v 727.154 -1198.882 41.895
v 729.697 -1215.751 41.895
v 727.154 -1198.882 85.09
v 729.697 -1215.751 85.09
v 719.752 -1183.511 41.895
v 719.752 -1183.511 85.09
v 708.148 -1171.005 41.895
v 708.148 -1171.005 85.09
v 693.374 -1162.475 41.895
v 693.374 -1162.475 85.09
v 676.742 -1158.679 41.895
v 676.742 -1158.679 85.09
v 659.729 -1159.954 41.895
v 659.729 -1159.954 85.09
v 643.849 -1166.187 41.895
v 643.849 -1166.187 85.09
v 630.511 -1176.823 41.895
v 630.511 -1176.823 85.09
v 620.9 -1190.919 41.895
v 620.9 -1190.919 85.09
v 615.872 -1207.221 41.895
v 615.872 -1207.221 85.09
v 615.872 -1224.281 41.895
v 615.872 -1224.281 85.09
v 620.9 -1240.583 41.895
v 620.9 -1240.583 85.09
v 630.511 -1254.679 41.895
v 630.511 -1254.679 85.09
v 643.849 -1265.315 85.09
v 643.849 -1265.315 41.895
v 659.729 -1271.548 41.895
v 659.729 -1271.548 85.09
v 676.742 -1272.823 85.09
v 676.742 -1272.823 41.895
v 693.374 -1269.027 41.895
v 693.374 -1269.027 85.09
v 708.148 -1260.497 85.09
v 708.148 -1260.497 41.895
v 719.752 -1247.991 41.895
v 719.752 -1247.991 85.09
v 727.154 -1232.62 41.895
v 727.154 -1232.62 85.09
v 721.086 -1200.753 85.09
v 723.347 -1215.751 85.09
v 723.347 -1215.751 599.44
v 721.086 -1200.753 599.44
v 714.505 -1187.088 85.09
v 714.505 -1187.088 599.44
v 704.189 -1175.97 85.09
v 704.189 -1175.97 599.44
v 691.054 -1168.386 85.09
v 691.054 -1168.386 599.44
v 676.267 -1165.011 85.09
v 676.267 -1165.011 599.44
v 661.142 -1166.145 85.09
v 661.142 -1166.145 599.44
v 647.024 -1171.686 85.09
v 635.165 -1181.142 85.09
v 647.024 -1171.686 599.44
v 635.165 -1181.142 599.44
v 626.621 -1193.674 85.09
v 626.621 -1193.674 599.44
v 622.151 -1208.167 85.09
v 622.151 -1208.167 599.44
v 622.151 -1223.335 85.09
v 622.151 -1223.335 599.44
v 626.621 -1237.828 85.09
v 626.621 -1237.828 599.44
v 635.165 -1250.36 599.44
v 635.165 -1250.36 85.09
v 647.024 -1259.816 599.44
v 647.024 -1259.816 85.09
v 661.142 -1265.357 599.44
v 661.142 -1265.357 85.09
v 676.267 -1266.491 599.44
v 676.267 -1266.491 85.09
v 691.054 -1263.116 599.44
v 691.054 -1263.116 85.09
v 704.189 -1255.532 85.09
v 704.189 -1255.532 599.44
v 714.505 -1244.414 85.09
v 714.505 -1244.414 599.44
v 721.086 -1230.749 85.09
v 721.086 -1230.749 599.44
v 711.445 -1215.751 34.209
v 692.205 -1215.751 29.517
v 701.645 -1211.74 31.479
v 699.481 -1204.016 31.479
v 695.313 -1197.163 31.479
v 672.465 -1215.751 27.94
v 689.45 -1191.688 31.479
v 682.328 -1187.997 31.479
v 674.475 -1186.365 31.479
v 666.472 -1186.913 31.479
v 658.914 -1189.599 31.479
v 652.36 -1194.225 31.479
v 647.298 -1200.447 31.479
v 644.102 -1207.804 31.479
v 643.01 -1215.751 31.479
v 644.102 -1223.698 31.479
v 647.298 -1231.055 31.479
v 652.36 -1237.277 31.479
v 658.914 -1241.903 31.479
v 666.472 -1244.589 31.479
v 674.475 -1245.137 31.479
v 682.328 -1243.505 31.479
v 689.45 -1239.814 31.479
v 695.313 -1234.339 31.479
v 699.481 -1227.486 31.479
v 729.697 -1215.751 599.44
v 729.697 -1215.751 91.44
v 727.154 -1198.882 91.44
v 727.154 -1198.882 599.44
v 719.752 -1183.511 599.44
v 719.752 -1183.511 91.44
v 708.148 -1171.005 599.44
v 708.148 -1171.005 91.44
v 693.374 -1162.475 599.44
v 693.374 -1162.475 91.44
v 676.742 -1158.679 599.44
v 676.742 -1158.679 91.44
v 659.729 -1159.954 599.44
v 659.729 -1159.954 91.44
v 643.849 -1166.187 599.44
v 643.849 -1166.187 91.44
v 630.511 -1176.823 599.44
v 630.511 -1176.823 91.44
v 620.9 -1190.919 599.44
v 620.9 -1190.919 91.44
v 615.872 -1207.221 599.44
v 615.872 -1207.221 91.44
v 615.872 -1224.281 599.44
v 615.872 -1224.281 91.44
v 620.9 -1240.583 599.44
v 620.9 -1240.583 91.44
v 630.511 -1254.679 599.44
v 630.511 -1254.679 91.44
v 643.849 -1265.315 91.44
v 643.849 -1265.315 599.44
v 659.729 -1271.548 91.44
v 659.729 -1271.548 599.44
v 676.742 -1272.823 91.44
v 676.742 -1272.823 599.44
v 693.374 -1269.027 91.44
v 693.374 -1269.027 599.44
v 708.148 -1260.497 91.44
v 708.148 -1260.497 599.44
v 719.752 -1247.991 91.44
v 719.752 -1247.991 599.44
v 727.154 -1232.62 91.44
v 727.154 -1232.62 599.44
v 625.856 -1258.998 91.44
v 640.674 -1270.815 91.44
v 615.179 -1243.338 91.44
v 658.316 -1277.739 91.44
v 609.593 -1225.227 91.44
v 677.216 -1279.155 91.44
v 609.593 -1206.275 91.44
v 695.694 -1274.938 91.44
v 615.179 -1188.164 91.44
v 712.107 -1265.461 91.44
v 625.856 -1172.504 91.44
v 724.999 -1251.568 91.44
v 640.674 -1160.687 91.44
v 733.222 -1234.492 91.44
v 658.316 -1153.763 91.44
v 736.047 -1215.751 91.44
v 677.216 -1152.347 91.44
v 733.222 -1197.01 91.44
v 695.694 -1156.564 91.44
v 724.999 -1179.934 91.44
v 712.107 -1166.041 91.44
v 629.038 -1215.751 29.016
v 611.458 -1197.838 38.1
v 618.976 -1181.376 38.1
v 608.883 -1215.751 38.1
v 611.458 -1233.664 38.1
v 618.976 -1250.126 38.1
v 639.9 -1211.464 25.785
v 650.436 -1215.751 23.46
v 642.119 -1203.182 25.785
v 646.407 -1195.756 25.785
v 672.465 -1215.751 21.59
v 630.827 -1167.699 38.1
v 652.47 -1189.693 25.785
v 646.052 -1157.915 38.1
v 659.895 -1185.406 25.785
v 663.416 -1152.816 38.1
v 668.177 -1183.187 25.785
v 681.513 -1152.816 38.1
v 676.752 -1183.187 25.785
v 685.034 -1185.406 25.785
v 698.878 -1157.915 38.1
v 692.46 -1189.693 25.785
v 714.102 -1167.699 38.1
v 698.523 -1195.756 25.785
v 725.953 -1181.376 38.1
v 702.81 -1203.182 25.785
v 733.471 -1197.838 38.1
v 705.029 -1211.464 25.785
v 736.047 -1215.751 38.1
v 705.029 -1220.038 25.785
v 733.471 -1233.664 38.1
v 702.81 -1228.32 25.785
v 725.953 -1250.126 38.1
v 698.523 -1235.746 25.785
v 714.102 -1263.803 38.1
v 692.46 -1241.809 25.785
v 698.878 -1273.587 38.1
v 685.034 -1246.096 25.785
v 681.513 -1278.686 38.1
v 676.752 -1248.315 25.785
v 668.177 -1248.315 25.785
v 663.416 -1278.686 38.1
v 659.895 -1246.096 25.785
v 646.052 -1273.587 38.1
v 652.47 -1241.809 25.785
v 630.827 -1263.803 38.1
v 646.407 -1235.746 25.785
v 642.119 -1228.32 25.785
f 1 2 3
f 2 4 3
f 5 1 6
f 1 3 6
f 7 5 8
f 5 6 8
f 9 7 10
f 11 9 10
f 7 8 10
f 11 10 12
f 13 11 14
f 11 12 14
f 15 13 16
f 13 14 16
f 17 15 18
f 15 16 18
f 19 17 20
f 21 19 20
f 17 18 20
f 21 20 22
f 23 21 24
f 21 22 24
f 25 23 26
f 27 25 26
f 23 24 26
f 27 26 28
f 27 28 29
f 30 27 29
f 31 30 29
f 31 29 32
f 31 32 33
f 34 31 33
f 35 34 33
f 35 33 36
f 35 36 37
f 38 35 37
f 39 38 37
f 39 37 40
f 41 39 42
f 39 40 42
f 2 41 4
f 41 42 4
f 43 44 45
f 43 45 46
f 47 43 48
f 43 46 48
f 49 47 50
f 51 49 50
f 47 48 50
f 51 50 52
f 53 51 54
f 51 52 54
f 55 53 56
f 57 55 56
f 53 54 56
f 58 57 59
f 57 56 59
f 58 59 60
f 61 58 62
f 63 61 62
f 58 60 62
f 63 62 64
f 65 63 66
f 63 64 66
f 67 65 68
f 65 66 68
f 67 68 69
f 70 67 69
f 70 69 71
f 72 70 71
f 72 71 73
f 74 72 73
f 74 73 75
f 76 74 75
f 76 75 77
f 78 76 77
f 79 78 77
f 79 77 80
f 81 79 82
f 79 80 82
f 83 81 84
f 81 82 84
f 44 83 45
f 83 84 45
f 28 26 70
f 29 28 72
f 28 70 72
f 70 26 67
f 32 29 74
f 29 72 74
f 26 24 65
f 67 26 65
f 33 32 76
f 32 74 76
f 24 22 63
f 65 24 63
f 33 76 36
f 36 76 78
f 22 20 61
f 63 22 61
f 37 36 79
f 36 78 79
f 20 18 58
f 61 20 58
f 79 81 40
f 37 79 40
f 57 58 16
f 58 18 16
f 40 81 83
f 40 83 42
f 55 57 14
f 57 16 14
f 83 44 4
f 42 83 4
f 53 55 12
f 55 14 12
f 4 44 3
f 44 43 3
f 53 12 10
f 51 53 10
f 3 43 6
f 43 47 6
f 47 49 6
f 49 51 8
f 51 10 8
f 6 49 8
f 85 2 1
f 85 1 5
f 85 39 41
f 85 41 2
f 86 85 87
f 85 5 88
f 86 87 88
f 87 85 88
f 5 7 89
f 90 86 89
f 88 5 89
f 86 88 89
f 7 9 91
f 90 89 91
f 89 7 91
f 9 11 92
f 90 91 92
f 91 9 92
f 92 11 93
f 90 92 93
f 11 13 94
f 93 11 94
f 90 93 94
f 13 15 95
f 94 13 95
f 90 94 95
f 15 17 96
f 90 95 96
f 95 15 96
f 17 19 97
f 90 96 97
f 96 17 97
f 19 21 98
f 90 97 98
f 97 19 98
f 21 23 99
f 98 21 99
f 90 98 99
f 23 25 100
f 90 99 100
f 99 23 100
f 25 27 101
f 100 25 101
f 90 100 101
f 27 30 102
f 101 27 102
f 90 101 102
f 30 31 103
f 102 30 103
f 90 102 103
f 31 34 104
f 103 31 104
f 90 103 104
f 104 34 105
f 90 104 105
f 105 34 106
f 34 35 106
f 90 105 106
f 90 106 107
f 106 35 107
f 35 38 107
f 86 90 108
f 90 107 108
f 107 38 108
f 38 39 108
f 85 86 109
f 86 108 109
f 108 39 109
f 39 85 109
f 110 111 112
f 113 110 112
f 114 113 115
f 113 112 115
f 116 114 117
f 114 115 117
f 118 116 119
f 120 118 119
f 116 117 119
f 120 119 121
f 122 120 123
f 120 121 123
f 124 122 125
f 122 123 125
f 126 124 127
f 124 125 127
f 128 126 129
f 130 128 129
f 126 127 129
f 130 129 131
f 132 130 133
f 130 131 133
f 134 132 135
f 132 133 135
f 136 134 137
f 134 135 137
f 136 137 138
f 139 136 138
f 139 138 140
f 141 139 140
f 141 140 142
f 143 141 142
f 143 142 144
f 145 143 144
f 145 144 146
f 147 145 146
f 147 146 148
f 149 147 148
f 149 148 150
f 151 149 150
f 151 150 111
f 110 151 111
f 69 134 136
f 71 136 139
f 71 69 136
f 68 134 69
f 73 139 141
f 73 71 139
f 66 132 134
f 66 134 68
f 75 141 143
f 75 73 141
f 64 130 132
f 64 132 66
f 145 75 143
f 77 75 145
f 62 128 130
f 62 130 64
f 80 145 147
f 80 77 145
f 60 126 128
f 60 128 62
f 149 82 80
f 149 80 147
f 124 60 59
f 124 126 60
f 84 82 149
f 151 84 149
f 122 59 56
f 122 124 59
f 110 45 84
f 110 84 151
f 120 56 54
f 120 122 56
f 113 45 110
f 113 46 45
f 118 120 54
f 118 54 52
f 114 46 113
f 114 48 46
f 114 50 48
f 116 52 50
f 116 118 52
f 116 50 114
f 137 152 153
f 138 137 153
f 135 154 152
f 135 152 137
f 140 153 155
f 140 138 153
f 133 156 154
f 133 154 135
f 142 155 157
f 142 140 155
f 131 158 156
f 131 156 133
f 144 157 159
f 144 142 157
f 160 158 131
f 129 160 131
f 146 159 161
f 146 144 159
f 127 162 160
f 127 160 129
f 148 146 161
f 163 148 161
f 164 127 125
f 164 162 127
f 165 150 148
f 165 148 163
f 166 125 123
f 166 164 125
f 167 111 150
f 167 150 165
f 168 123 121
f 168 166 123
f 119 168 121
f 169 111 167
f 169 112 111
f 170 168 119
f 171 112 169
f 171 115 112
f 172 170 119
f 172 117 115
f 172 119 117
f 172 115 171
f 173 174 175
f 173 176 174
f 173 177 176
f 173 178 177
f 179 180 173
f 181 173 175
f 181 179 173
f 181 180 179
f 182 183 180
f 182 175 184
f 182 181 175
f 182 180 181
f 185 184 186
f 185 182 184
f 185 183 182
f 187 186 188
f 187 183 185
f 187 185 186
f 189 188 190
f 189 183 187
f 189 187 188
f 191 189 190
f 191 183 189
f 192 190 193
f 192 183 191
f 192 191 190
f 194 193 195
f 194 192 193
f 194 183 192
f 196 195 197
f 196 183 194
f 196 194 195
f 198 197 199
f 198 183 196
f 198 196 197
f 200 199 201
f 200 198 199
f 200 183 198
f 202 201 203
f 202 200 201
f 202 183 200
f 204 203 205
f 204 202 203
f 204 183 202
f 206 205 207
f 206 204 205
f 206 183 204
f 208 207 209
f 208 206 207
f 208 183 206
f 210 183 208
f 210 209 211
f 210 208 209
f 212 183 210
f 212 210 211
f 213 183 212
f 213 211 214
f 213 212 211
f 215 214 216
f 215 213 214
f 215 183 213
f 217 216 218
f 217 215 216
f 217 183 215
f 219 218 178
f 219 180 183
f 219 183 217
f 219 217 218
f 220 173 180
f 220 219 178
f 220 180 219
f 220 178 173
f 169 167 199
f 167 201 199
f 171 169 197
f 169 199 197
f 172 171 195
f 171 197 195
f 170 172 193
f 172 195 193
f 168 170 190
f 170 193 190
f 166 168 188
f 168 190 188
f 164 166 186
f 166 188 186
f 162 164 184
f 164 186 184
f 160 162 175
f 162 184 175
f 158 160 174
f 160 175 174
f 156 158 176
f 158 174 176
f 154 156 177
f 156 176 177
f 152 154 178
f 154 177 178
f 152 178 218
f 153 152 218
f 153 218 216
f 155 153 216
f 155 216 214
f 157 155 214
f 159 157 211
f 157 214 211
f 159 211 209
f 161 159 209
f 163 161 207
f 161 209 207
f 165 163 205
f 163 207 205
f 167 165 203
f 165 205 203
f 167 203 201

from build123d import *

# Parameters (mm, degrees)
SKETCH2_R           = 63.582050125
BOSS_EXTRUDE1_DEPTH = 2.54
DOME1_FACE_RADIUS   = 63.582050125
DOME1_HEIGHT        = 16.51
SKETCH3_R           = 63.582050125
SKETCH3_R_2         = 57.232050125
BOSS_EXTRUDE2_DEPTH = 50.8
SKETCH4_R           = 57.232050125
SKETCH4_R_2         = 50.882050125
BOSS_EXTRUDE3_DEPTH = 558.8
SKETCH5_R           = 50.882050125
BOSS_EXTRUDE4_DEPTH = 558.8


# Read off the part's stored shape, not the designer's step: Shell1
with BuildPart() as part:
    # Sketch2 → Boss-Extrude1 (new body)
    with BuildSketch(Plane.XY.offset(38.1)):
        with Locations((672.464575935, -1215.750984812)):
            Circle(SKETCH2_R)
    extrude(amount=BOSS_EXTRUDE1_DEPTH)

    # Dome1: a dome of height H over a round flat face of radius A is a cap of a sphere of radius (A * A + H * H) / (2 * H)
    dome1_r = (DOME1_FACE_RADIUS * DOME1_FACE_RADIUS + DOME1_HEIGHT * DOME1_HEIGHT) / (2 * DOME1_HEIGHT)
    dome1_base = Plane((672.464575935, -1215.750984812, 38.1), z_dir=(0, 0, -1))
    with Locations(dome1_base.offset(DOME1_HEIGHT - dome1_r)):
        dome1_ball = Sphere(dome1_r, mode=Mode.PRIVATE)
    add(split(dome1_ball, bisect_by=dome1_base, keep=Keep.TOP, mode=Mode.PRIVATE))

    # Sketch3 → Boss-Extrude2 (add)
    with BuildSketch(Plane.XY.offset(40.64)):
        with Locations((672.464575935, -1215.750984812)):
            Circle(SKETCH3_R)
        with Locations((672.464575935, -1215.750984812)):
            Circle(SKETCH3_R_2, mode=Mode.SUBTRACT)
    extrude(amount=BOSS_EXTRUDE2_DEPTH)

    # Sketch4 → Boss-Extrude3 (add)
    with BuildSketch(Plane.XY.offset(40.64)):
        with Locations((672.464575935, -1215.750984812)):
            Circle(SKETCH4_R)
        with Locations((672.464575935, -1215.750984812)):
            Circle(SKETCH4_R_2, mode=Mode.SUBTRACT)
    extrude(amount=BOSS_EXTRUDE3_DEPTH)

    # Sketch5 → Boss-Extrude4 (add)
    with BuildSketch(Plane.XY.offset(40.64)):
        with Locations((672.464575935, -1215.750984812)):
            Circle(SKETCH5_R)
    extrude(amount=BOSS_EXTRUDE4_DEPTH)

    # Shell1 outline → Shell1 (revolve, cut)
    with BuildSketch(Plane(origin=(672.464575935, -1215.750984812, 0), x_dir=(1, 0, 0), z_dir=(0, -1, 0))):
        with BuildLine():
            Line((57.232050162, 41.895123211), (57.232050125, 85.09))
            Line((57.232050125, 85.09), (50.882050125, 85.09))
            Line((50.882050125, 85.09), (50.882050125, 599.44))
            Line((50.882050125, 599.44), (0, 599.44))
            Line((0, 599.44), (0, 27.94))
            ThreePointArc((0, 27.94), (29.454426788, 31.47915065), (57.232050162, 41.895123211))
        make_face()
    revolve(axis=Axis((672.464575935, -1215.750984812, 0), (0, 0, 1)), mode=Mode.SUBTRACT)


solid = part.part
